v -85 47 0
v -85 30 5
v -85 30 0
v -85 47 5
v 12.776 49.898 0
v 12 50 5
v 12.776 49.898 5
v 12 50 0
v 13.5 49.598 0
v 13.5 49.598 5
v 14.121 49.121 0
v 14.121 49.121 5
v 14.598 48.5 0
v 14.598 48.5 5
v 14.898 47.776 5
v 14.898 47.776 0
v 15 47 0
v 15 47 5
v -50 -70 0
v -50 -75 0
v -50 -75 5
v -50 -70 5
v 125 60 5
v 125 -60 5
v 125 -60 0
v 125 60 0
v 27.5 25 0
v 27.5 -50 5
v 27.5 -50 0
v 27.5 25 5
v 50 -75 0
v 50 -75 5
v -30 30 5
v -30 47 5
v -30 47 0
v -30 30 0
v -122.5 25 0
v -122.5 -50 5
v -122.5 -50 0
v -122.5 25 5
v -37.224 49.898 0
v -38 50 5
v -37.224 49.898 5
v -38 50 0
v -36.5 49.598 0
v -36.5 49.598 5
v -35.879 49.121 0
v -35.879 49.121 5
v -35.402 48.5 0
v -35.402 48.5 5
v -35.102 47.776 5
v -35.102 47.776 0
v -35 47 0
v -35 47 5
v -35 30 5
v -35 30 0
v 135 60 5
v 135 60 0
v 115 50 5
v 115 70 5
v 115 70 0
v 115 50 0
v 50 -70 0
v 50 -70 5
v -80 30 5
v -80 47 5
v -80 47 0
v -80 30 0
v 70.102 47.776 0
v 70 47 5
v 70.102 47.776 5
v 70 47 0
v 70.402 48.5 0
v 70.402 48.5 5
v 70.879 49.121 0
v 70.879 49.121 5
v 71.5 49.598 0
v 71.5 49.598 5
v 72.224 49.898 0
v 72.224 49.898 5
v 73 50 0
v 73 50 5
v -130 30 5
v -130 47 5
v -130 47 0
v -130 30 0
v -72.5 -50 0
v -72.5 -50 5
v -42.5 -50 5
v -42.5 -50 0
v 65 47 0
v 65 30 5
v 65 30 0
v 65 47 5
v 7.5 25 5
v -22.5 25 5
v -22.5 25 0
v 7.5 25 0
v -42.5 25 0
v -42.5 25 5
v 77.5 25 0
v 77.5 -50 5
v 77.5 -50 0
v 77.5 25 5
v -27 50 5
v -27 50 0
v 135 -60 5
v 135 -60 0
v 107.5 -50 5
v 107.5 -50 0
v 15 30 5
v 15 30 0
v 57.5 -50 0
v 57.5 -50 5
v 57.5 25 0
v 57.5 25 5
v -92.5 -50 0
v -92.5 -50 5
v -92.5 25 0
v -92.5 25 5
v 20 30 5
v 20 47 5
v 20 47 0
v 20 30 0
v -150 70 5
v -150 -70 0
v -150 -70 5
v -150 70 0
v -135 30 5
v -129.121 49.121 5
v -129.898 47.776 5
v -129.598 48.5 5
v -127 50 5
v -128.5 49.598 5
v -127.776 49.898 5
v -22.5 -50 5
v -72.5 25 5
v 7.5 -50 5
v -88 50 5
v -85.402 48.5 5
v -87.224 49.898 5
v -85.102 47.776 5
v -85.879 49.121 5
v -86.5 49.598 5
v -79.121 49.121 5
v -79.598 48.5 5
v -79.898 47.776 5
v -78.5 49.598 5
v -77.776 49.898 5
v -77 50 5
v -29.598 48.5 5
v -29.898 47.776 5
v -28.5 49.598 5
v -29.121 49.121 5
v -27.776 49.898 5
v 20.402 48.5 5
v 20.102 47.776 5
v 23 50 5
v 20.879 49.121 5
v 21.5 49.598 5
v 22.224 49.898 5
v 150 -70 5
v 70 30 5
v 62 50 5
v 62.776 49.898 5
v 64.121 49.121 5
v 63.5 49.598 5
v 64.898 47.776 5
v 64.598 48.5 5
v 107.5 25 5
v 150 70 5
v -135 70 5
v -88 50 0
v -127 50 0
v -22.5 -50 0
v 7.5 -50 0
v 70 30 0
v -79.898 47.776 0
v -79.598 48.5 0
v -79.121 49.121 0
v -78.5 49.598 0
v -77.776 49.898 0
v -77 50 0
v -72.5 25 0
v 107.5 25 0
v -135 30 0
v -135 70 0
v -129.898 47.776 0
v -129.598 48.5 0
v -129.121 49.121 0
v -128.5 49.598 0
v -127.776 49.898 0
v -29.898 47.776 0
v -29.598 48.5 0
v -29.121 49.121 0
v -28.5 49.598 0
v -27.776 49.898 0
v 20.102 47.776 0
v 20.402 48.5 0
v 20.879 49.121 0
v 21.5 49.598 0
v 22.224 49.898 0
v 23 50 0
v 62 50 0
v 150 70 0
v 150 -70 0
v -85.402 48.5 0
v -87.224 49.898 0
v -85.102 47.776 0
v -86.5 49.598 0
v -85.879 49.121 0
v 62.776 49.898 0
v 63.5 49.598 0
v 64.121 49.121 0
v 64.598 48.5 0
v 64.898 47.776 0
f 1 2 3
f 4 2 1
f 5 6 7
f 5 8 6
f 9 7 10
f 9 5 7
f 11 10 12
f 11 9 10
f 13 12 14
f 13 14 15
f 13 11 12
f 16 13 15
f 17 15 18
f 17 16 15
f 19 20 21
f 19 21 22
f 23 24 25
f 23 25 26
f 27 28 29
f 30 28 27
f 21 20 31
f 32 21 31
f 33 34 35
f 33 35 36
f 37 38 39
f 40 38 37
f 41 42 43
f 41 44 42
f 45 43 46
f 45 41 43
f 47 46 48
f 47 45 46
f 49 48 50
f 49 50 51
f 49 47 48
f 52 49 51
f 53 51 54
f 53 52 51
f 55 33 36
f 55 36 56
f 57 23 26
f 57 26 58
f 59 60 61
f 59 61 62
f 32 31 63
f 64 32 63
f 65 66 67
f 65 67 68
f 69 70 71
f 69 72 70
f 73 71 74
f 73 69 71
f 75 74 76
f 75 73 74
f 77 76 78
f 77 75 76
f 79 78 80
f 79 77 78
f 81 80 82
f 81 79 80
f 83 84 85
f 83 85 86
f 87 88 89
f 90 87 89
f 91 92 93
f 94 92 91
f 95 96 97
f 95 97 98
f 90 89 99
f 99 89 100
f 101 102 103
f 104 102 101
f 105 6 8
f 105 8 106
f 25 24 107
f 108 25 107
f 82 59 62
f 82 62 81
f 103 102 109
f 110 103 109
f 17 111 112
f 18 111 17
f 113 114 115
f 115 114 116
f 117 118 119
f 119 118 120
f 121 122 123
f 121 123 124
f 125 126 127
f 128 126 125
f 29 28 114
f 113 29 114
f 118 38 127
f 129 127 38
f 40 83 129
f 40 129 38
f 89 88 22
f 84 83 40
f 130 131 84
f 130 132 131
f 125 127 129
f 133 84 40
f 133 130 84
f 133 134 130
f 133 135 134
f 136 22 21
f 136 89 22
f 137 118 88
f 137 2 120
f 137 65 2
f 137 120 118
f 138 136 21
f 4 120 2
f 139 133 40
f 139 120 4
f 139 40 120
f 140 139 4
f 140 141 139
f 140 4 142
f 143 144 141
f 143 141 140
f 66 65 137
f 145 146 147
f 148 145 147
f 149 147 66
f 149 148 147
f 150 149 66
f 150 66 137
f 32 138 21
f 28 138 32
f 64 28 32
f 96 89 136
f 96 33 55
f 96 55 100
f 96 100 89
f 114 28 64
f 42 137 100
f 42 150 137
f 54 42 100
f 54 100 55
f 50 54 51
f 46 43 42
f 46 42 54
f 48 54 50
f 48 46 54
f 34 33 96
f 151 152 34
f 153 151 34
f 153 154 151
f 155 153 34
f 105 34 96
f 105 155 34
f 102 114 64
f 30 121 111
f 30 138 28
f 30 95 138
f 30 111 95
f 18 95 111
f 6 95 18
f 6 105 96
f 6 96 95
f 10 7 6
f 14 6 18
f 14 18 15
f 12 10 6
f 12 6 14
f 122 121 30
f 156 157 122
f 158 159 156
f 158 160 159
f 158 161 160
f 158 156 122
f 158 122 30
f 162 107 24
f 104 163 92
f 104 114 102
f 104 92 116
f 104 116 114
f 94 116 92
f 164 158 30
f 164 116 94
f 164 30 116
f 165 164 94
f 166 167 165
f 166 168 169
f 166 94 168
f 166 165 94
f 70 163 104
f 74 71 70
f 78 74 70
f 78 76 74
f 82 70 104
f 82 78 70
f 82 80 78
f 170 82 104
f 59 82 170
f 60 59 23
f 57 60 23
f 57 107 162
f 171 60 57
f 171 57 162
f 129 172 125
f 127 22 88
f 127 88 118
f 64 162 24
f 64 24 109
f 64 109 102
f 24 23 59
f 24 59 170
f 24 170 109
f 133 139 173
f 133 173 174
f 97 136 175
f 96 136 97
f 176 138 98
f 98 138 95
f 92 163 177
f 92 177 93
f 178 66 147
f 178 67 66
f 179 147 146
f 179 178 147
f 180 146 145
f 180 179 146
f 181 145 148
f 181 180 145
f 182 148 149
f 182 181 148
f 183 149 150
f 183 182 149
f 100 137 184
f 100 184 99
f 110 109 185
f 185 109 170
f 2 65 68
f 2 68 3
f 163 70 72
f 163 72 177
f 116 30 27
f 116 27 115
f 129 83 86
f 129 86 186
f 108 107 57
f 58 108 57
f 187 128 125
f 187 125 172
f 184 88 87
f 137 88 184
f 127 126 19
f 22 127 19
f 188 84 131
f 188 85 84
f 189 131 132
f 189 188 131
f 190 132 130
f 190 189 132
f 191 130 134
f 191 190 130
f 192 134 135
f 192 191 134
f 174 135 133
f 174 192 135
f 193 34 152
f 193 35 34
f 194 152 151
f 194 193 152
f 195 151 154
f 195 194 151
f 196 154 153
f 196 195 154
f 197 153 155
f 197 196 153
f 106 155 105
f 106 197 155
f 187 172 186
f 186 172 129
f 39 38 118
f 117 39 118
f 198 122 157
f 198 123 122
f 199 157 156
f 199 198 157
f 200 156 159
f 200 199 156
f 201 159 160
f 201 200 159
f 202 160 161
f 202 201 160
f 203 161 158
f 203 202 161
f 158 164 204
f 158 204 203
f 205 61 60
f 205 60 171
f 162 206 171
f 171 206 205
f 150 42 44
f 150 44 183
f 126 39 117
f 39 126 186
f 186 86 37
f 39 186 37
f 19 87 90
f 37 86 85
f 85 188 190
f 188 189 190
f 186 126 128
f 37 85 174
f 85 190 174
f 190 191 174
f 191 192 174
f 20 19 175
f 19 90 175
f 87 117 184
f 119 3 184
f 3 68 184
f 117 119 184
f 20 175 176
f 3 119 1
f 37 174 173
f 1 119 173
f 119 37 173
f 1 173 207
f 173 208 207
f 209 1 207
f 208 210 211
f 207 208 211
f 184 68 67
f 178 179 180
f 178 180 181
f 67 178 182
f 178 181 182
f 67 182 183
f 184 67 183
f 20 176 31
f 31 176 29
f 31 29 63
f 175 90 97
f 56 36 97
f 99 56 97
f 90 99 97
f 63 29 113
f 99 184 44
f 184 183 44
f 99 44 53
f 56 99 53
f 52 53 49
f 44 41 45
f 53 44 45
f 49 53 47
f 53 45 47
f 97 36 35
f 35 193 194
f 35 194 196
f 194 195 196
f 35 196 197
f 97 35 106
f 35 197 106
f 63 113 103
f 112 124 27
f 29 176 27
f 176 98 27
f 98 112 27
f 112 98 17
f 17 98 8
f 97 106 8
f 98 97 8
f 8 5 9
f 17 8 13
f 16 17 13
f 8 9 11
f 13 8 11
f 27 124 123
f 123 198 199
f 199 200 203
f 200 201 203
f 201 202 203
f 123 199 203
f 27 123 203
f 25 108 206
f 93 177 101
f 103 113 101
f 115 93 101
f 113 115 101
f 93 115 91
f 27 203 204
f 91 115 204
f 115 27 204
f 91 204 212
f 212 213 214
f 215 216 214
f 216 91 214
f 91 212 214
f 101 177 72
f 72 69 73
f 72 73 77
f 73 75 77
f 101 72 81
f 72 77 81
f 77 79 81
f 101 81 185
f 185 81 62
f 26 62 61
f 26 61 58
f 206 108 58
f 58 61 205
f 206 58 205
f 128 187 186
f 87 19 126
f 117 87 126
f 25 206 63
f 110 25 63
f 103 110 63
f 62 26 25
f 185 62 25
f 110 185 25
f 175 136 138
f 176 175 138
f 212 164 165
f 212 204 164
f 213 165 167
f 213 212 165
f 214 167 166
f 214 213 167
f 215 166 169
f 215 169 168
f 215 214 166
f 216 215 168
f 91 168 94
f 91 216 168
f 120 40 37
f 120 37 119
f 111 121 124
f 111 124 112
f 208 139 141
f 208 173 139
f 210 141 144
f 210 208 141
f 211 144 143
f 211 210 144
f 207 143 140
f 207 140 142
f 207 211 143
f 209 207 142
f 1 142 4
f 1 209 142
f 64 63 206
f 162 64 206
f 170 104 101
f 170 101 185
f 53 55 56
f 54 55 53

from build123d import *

# Parameters (mm, degrees)
SKIZZE1_W                       = 100
SKIZZE1_H                       = 5
SKIZZE1_W_2                     = 300
SKIZZE1_H_2                     = 140
AUFSATZ_LINEAR_AUSTRAGEN1_DEPTH = 5
SCHNITT_LINEAR_AUSTRAGEN1_DEPTH = 168.779617356
VERRUNDUNG1_R                   = 3
SKIZZE3_W                       = 30
SKIZZE3_H                       = 75
SKIZZE3_W_2                     = 10
SKIZZE3_H_2                     = 120
SCHNITT_LINEAR_AUSTRAGEN2_DEPTH = 168.779617356


with BuildPart() as part:
    # Skizze1 → Aufsatz-Linear austragen1 (new body)
    with BuildSketch(Plane.XY):
        with Locations((0, -72.5)):
            Rectangle(SKIZZE1_W, SKIZZE1_H)
        Rectangle(SKIZZE1_W_2, SKIZZE1_H_2)
    extrude(amount=AUFSATZ_LINEAR_AUSTRAGEN1_DEPTH)

    # Skizze2 → Schnitt-Linear austragen1 (cut, through all)
    with BuildSketch(Plane.XY.offset(5)):
        Polygon((-135, 70), (115, 70), (115, 50), (70, 50), (70, 30), (65, 30), (65, 50), (20, 50), (20, 30), (15, 30), (15, 50), (-30, 50), (-30, 30), (-35, 30), (-35, 50), (-80, 50), (-80, 30), (-85, 30), (-85, 50), (-130, 50), (-130, 30), (-135, 30), (-135, 50), align=None)
    extrude(amount=-SCHNITT_LINEAR_AUSTRAGEN1_DEPTH, mode=Mode.SUBTRACT)

    # Verrundung1
    verrundung1_edges = [part.edges().sort_by_distance(p)[0] for p in [
        (70, 50, 2.5),
        (65, 50, 2.5),
        (20, 50, 2.5),
        (15, 50, 2.5),
        (-30, 50, 2.5),
        (-35, 50, 2.5),
        (-80, 50, 2.5),
        (-85, 50, 2.5),
        (-130, 50, 2.5),
    ]]
    fillet(verrundung1_edges, radius=VERRUNDUNG1_R)

    # Skizze3 → Schnitt-Linear austragen2 (cut, through all)
    with BuildSketch(Plane.XY.offset(5)):
        with Locations((-107.5, -12.5)):
            Rectangle(SKIZZE3_W, SKIZZE3_H)
        with Locations((-57.5, -12.5)):
            Rectangle(SKIZZE3_W, SKIZZE3_H)
        with Locations((-7.5, -12.5)):
            Rectangle(SKIZZE3_W, SKIZZE3_H)
        with Locations((42.5, -12.5)):
            Rectangle(SKIZZE3_W, SKIZZE3_H)
        with Locations((92.5, -12.5)):
            Rectangle(SKIZZE3_W, SKIZZE3_H)
        with Locations((130, 0)):
            Rectangle(SKIZZE3_W_2, SKIZZE3_H_2)
    extrude(amount=-SCHNITT_LINEAR_AUSTRAGEN2_DEPTH, mode=Mode.SUBTRACT)


solid = part.part
